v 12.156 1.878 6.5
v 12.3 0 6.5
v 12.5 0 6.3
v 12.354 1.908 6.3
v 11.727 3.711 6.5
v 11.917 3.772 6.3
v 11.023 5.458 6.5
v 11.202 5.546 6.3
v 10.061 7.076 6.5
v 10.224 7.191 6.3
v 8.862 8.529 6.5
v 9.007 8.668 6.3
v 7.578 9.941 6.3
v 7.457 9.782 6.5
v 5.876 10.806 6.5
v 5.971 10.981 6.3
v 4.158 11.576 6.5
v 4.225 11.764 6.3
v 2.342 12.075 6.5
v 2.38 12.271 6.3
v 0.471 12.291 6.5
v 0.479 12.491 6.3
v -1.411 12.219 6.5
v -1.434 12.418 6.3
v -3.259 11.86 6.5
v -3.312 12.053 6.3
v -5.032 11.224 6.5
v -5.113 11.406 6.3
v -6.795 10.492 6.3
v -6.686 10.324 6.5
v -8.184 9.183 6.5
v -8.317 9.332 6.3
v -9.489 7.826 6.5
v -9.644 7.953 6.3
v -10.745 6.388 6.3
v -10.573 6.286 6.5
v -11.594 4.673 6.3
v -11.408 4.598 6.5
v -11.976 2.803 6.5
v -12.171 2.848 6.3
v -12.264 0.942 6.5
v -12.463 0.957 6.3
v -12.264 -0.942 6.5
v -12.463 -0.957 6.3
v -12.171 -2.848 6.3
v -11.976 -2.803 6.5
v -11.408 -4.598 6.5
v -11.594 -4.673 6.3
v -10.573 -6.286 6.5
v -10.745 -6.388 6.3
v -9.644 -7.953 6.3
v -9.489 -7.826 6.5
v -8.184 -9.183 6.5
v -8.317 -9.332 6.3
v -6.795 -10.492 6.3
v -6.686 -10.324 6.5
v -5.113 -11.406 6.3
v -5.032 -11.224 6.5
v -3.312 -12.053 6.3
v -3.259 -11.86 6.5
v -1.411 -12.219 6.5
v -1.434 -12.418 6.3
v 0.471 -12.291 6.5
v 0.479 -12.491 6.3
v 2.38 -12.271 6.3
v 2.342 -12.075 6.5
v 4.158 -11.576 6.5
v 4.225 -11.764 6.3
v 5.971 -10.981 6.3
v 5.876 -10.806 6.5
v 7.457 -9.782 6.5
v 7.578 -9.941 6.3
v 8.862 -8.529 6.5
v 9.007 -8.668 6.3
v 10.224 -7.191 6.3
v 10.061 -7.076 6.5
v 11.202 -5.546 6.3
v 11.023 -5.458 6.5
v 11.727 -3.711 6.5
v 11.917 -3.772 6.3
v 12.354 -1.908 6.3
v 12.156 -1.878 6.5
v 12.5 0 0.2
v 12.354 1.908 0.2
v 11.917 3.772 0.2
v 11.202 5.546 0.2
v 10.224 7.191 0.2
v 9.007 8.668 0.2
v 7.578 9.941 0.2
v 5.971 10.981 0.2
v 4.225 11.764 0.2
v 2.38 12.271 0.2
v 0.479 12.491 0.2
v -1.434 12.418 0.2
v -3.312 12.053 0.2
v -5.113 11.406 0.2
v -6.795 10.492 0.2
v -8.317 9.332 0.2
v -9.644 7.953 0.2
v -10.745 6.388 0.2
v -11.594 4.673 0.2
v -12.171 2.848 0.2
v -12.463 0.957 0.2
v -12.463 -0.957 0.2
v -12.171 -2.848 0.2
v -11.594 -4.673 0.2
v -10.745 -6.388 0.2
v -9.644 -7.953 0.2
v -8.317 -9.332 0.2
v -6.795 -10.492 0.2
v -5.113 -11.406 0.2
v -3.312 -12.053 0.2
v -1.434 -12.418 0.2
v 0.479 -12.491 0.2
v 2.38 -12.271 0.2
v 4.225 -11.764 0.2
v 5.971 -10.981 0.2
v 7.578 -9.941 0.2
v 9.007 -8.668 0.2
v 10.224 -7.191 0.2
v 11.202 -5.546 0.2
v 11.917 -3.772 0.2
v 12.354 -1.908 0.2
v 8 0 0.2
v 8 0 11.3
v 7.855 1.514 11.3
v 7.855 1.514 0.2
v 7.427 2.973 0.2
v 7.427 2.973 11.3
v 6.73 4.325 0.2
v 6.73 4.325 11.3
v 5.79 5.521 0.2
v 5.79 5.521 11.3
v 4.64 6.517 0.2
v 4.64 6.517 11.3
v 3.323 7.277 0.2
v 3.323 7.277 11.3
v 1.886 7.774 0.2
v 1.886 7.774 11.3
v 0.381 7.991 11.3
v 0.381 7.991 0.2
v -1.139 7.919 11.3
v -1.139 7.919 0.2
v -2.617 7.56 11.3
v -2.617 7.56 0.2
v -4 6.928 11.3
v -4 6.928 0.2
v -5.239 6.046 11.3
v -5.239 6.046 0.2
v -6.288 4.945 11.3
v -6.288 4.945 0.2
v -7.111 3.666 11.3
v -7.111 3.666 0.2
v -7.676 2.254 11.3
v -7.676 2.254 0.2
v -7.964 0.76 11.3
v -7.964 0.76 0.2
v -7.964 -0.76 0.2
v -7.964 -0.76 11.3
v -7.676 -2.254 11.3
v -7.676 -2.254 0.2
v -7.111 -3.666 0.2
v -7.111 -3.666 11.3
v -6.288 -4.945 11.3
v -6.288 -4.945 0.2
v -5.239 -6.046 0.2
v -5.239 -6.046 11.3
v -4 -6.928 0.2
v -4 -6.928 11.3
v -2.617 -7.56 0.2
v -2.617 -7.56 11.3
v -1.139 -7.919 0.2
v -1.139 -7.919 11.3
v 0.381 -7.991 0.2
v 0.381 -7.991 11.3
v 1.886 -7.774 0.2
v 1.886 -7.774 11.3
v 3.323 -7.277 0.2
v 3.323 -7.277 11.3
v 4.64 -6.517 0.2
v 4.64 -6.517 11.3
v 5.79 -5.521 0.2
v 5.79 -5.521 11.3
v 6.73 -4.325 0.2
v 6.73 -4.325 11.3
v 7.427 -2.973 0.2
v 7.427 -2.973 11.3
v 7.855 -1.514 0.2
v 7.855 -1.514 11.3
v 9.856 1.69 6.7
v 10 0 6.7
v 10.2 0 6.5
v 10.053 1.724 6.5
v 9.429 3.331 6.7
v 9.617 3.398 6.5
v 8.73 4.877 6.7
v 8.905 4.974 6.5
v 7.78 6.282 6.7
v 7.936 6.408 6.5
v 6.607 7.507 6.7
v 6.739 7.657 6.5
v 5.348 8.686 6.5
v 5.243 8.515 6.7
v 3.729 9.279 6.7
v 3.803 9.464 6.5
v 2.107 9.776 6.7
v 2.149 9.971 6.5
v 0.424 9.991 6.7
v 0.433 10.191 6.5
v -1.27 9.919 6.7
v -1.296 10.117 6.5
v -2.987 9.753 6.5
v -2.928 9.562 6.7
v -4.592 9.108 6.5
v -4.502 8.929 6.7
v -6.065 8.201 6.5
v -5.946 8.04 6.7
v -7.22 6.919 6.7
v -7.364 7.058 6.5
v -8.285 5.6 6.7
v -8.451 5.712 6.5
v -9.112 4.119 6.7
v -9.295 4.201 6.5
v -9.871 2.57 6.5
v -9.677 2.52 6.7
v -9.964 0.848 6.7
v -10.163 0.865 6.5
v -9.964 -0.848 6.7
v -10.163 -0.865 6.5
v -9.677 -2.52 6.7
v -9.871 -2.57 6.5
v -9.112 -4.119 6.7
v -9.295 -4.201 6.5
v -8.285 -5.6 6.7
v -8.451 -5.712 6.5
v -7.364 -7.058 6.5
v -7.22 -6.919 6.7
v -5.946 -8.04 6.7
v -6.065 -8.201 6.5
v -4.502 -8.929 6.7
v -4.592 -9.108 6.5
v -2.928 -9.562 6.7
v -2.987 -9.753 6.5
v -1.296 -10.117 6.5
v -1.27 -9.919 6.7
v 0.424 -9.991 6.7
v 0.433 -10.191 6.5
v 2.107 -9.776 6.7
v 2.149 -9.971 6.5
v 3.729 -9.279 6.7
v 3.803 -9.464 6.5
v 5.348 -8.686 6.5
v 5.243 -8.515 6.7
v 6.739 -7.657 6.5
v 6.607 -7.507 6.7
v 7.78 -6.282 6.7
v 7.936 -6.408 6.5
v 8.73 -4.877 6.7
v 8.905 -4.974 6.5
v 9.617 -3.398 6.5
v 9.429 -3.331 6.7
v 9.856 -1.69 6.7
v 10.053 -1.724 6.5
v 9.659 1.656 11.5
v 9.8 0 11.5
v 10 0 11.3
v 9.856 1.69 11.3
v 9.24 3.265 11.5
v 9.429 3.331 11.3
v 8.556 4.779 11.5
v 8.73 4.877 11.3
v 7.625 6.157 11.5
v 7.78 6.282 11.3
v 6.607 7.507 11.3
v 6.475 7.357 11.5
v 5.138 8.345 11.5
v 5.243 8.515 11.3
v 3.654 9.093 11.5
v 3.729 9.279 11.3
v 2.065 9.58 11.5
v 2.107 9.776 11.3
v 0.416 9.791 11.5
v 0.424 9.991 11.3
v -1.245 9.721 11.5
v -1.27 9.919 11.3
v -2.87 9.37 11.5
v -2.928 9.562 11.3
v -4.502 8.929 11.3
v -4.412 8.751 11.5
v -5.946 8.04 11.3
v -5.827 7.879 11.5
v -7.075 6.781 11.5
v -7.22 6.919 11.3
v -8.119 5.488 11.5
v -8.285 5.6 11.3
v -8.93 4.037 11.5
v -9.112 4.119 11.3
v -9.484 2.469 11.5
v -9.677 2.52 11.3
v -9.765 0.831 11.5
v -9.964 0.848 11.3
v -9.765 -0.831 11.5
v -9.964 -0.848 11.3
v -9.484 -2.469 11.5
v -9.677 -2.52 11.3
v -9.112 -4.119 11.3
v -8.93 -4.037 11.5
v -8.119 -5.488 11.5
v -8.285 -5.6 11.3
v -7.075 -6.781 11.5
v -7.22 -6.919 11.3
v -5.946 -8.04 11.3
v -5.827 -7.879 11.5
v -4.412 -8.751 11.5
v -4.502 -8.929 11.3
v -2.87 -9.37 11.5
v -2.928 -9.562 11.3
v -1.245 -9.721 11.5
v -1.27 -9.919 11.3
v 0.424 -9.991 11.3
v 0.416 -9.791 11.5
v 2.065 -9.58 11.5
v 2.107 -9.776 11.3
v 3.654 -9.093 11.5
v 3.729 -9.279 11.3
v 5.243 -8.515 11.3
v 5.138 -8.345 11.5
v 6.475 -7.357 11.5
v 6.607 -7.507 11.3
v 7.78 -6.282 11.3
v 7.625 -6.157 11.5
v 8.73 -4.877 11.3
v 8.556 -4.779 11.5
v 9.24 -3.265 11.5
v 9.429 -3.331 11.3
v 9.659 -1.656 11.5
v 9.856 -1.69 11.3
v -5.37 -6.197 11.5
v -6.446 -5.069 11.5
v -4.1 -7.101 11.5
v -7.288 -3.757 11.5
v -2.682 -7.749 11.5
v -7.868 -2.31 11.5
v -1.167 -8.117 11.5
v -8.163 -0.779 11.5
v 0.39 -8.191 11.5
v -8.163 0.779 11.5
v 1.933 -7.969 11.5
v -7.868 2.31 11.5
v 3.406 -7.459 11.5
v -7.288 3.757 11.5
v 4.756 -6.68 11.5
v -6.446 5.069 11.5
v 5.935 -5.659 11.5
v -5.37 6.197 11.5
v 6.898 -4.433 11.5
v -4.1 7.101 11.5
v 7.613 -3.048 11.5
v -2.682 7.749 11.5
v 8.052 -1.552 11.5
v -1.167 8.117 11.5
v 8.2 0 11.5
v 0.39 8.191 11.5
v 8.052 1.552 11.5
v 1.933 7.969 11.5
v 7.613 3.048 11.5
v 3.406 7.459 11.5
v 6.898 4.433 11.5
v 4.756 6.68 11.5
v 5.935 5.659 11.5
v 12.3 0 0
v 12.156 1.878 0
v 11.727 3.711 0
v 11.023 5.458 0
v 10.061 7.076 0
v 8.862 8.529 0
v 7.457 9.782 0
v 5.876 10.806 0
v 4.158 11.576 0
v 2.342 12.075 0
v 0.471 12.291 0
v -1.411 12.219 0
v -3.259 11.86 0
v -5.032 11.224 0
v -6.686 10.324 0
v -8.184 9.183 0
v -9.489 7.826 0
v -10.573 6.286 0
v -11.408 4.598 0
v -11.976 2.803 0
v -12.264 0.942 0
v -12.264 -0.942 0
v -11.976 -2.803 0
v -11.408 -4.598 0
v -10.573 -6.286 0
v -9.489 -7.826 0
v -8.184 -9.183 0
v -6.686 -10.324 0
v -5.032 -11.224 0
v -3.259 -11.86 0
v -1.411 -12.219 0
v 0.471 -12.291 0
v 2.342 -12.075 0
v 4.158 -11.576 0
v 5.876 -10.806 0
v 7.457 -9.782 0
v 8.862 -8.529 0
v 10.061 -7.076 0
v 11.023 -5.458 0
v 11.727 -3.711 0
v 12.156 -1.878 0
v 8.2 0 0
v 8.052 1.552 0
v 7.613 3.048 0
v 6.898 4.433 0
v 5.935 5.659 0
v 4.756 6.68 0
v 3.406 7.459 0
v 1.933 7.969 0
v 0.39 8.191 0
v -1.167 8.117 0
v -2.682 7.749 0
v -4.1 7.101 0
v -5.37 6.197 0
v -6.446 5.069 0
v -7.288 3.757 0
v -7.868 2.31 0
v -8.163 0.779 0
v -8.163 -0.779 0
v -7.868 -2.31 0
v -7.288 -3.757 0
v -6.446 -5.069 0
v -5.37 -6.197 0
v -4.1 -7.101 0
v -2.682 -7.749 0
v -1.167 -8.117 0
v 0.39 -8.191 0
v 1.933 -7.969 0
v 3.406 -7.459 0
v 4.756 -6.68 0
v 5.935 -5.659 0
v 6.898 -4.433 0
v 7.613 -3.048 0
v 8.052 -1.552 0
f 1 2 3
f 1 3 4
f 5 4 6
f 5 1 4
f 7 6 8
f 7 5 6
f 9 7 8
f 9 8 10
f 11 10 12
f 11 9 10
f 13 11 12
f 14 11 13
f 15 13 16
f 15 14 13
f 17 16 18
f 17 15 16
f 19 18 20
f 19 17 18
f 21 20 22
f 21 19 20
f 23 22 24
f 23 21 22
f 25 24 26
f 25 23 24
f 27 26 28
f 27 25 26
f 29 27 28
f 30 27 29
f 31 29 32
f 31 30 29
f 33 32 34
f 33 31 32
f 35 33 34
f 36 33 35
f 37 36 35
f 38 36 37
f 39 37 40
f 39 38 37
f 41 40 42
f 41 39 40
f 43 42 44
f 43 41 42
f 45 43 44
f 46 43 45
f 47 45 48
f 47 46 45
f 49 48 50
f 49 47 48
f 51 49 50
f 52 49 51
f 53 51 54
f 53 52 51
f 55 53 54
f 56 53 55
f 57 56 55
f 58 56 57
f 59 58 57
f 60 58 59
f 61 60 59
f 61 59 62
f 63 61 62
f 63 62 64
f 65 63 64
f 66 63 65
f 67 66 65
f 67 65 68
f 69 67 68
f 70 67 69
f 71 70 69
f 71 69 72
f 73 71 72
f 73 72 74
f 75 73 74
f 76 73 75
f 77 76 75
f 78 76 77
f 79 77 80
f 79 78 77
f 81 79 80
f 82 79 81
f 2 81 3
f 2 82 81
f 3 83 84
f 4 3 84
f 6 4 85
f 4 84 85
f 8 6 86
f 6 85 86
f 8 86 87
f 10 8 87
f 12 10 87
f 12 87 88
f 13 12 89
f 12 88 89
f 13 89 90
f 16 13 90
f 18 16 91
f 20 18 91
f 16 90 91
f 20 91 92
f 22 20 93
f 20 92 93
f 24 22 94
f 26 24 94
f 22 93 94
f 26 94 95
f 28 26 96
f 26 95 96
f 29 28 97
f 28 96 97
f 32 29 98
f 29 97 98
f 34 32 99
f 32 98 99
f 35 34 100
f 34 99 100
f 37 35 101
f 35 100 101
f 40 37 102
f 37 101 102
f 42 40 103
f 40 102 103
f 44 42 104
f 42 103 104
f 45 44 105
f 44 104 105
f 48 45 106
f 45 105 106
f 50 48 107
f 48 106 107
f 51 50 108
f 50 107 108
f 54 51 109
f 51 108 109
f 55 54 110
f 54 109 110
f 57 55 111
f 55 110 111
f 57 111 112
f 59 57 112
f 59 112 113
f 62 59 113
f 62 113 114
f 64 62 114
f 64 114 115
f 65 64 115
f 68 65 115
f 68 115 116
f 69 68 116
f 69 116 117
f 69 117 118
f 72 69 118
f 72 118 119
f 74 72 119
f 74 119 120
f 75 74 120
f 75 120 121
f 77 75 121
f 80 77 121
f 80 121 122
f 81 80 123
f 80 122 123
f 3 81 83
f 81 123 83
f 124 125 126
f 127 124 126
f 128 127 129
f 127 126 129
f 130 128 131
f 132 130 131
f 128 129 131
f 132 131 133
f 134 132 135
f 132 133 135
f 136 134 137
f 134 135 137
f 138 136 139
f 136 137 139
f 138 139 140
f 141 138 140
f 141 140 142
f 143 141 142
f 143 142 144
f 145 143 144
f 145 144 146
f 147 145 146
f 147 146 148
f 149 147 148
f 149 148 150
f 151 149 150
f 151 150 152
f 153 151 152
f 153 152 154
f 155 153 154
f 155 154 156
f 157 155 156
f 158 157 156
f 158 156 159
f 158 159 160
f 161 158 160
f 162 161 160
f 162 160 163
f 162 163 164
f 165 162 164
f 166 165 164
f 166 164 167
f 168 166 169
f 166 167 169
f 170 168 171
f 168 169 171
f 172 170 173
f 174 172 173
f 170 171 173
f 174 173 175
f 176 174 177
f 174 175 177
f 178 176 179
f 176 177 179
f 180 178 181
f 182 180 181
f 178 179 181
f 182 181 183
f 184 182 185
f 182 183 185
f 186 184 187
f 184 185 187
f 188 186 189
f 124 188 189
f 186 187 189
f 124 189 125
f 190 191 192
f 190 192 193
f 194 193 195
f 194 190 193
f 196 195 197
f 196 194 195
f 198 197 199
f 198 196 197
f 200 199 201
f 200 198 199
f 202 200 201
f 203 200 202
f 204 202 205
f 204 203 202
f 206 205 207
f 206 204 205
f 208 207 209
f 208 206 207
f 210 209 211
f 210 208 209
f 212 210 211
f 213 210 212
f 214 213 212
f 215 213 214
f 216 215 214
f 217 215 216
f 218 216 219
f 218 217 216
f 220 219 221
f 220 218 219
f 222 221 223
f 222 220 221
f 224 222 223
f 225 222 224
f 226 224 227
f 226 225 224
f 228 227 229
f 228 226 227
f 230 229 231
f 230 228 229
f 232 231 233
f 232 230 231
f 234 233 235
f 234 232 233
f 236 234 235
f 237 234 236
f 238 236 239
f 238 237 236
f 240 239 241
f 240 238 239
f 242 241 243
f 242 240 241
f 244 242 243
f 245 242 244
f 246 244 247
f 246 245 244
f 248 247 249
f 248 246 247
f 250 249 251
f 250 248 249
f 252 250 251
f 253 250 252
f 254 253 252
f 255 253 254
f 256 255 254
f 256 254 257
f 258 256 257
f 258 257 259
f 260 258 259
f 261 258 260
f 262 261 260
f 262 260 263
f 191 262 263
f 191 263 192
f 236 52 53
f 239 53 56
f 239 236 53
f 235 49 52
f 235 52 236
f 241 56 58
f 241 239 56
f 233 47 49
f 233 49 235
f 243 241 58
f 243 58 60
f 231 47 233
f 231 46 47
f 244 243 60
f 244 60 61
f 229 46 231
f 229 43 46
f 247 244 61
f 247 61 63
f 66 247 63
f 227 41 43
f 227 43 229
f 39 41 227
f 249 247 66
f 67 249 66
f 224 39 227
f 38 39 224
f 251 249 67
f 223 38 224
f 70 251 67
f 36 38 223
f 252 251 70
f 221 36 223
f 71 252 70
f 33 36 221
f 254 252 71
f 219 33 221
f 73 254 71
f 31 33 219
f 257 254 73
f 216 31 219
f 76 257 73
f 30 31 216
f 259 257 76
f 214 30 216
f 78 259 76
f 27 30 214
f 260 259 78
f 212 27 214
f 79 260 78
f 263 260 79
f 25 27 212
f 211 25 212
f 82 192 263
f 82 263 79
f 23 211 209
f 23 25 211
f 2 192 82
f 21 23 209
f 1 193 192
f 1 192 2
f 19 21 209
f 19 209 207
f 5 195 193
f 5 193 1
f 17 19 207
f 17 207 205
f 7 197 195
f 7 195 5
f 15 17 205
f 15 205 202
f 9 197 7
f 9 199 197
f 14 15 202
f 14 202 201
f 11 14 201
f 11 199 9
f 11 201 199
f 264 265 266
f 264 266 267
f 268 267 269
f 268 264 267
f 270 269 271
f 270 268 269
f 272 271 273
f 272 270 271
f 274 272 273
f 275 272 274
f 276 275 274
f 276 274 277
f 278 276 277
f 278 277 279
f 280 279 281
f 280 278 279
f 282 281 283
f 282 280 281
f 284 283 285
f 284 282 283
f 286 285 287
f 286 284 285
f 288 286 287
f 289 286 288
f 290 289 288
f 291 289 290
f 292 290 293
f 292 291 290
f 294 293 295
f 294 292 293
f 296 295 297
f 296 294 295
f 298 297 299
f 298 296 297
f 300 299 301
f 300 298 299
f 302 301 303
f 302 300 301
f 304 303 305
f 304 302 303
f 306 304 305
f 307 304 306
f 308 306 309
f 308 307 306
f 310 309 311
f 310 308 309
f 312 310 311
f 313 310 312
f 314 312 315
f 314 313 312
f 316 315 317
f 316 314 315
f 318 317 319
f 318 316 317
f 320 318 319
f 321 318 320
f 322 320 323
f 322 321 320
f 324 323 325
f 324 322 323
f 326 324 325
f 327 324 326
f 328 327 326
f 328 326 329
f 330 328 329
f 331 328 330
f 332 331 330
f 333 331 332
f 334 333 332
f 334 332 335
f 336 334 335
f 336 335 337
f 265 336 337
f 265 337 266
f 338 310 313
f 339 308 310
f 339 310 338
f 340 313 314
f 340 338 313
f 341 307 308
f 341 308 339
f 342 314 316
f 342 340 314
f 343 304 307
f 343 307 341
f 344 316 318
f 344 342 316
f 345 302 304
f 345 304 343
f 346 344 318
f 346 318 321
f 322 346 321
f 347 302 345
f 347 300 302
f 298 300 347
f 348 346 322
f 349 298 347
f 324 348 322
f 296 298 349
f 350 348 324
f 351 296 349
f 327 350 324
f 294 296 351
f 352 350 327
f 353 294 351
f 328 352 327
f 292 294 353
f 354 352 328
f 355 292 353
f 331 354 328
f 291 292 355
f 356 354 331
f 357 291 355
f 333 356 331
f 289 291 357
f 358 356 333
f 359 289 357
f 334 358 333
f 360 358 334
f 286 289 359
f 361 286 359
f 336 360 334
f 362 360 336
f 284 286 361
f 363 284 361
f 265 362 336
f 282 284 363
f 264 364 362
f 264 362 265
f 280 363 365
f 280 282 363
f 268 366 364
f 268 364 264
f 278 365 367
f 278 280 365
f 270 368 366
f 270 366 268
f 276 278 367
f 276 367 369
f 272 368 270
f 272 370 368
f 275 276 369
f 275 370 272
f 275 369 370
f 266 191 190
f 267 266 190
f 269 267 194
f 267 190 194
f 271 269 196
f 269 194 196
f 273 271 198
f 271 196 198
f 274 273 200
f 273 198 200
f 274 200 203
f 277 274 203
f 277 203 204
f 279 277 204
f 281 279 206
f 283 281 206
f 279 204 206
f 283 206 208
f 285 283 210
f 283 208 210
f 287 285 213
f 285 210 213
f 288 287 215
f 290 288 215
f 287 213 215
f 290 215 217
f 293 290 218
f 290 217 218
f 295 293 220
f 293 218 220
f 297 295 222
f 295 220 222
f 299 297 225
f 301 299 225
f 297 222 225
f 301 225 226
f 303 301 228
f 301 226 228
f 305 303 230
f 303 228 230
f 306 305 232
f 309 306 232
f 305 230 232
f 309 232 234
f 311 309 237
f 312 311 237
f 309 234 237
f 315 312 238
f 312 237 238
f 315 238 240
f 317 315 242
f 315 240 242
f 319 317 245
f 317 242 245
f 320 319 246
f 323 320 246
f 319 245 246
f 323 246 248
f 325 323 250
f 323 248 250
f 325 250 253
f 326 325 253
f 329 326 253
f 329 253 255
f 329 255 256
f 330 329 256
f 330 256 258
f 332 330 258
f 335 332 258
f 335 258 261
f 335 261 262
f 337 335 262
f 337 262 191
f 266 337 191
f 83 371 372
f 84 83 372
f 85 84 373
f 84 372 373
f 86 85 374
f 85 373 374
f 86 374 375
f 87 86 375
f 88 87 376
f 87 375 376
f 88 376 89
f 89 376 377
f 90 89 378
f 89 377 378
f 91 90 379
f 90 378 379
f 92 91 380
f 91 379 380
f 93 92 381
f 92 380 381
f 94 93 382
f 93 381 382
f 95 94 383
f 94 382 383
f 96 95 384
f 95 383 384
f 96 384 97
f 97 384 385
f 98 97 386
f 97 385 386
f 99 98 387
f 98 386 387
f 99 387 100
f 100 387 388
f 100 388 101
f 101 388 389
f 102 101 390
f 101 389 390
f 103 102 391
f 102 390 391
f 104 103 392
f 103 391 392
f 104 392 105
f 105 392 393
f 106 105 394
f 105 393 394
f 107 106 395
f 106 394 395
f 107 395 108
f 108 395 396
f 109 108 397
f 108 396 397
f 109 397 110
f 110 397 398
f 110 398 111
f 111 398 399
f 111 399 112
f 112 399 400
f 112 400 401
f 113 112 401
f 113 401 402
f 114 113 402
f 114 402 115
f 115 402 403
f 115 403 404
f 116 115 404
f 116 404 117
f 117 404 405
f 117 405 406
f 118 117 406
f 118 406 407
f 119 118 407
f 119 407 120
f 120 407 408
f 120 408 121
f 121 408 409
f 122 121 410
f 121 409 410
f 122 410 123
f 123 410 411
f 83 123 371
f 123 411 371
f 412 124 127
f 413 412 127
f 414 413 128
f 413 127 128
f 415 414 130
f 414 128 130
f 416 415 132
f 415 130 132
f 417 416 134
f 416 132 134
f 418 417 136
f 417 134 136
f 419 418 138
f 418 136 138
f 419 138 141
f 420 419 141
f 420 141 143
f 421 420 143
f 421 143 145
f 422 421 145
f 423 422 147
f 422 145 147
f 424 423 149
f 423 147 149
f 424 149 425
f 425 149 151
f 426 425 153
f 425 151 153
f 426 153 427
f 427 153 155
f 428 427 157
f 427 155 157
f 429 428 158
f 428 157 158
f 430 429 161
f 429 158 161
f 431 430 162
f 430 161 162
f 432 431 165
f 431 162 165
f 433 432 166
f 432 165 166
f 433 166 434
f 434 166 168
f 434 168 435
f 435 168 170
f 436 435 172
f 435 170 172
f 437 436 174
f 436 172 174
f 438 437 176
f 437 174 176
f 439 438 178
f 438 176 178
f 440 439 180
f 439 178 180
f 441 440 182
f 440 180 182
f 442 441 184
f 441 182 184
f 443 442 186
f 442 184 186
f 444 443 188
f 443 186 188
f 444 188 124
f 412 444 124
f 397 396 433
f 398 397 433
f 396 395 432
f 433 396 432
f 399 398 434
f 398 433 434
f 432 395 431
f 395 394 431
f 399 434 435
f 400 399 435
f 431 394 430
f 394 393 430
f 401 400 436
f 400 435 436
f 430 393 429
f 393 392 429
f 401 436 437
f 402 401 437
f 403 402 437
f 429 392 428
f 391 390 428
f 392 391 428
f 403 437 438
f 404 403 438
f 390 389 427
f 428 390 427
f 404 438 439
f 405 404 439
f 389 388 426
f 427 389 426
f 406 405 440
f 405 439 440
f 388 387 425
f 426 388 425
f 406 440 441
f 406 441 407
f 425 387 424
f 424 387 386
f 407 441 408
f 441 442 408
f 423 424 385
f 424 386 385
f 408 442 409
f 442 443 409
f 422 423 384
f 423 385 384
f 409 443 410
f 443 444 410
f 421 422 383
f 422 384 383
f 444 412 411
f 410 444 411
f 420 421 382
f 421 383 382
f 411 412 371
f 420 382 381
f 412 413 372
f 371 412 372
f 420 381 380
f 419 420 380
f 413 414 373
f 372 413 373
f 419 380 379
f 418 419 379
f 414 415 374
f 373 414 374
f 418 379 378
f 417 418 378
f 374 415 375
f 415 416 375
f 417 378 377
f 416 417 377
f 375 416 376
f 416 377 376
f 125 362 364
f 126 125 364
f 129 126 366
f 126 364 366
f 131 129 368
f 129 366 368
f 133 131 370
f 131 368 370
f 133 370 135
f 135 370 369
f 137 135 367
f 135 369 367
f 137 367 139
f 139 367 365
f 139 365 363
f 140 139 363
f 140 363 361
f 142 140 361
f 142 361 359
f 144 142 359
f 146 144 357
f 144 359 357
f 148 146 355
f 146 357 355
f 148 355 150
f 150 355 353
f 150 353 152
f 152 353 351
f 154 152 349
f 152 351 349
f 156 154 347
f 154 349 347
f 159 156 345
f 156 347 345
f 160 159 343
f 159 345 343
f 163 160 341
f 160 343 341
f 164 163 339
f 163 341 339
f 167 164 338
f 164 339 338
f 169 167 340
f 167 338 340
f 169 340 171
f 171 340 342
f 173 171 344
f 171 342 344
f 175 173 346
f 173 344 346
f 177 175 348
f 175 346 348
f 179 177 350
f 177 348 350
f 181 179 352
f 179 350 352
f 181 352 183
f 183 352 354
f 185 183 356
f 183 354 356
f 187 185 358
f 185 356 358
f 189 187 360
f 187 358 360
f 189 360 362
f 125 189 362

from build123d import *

# Parameters (mm, degrees)
F0_R     = 12.5
F1_DEPTH = 6.5
F2_R     = 10
F3_DEPTH = 5
F4_R     = 8
F5_DEPTH = 11.501
F6_SIZE  = 0.2


with BuildPart() as f1:
    # F0 (on Top) → F1 (new body)
    with BuildSketch(Plane.XY):
        Circle(F0_R)
    extrude(amount=F1_DEPTH)

    # F2 (on face) → F3 (join)
    with BuildSketch(Plane.XY.offset(6.5)):
        Circle(F2_R)
    extrude(amount=F3_DEPTH)

    # F4 (on face) → F5 (cut, through all)
    with BuildSketch(Plane.XY.offset(11.5)):
        Circle(F4_R)
    extrude(amount=-F5_DEPTH, mode=Mode.SUBTRACT)

    # F6
    f6_edges = [f1.edges().sort_by_distance(p)[0] for p in [
        (-10, 0, 11.5),
        (-8, 0, 11.5),
        (-12.5, 0, 6.5),
        (-10, 0, 6.5),
        (-12.5, 0, 0),
        (-8, 0, 0),
    ]]
    chamfer(f6_edges, length=F6_SIZE)


solid = f1.part
